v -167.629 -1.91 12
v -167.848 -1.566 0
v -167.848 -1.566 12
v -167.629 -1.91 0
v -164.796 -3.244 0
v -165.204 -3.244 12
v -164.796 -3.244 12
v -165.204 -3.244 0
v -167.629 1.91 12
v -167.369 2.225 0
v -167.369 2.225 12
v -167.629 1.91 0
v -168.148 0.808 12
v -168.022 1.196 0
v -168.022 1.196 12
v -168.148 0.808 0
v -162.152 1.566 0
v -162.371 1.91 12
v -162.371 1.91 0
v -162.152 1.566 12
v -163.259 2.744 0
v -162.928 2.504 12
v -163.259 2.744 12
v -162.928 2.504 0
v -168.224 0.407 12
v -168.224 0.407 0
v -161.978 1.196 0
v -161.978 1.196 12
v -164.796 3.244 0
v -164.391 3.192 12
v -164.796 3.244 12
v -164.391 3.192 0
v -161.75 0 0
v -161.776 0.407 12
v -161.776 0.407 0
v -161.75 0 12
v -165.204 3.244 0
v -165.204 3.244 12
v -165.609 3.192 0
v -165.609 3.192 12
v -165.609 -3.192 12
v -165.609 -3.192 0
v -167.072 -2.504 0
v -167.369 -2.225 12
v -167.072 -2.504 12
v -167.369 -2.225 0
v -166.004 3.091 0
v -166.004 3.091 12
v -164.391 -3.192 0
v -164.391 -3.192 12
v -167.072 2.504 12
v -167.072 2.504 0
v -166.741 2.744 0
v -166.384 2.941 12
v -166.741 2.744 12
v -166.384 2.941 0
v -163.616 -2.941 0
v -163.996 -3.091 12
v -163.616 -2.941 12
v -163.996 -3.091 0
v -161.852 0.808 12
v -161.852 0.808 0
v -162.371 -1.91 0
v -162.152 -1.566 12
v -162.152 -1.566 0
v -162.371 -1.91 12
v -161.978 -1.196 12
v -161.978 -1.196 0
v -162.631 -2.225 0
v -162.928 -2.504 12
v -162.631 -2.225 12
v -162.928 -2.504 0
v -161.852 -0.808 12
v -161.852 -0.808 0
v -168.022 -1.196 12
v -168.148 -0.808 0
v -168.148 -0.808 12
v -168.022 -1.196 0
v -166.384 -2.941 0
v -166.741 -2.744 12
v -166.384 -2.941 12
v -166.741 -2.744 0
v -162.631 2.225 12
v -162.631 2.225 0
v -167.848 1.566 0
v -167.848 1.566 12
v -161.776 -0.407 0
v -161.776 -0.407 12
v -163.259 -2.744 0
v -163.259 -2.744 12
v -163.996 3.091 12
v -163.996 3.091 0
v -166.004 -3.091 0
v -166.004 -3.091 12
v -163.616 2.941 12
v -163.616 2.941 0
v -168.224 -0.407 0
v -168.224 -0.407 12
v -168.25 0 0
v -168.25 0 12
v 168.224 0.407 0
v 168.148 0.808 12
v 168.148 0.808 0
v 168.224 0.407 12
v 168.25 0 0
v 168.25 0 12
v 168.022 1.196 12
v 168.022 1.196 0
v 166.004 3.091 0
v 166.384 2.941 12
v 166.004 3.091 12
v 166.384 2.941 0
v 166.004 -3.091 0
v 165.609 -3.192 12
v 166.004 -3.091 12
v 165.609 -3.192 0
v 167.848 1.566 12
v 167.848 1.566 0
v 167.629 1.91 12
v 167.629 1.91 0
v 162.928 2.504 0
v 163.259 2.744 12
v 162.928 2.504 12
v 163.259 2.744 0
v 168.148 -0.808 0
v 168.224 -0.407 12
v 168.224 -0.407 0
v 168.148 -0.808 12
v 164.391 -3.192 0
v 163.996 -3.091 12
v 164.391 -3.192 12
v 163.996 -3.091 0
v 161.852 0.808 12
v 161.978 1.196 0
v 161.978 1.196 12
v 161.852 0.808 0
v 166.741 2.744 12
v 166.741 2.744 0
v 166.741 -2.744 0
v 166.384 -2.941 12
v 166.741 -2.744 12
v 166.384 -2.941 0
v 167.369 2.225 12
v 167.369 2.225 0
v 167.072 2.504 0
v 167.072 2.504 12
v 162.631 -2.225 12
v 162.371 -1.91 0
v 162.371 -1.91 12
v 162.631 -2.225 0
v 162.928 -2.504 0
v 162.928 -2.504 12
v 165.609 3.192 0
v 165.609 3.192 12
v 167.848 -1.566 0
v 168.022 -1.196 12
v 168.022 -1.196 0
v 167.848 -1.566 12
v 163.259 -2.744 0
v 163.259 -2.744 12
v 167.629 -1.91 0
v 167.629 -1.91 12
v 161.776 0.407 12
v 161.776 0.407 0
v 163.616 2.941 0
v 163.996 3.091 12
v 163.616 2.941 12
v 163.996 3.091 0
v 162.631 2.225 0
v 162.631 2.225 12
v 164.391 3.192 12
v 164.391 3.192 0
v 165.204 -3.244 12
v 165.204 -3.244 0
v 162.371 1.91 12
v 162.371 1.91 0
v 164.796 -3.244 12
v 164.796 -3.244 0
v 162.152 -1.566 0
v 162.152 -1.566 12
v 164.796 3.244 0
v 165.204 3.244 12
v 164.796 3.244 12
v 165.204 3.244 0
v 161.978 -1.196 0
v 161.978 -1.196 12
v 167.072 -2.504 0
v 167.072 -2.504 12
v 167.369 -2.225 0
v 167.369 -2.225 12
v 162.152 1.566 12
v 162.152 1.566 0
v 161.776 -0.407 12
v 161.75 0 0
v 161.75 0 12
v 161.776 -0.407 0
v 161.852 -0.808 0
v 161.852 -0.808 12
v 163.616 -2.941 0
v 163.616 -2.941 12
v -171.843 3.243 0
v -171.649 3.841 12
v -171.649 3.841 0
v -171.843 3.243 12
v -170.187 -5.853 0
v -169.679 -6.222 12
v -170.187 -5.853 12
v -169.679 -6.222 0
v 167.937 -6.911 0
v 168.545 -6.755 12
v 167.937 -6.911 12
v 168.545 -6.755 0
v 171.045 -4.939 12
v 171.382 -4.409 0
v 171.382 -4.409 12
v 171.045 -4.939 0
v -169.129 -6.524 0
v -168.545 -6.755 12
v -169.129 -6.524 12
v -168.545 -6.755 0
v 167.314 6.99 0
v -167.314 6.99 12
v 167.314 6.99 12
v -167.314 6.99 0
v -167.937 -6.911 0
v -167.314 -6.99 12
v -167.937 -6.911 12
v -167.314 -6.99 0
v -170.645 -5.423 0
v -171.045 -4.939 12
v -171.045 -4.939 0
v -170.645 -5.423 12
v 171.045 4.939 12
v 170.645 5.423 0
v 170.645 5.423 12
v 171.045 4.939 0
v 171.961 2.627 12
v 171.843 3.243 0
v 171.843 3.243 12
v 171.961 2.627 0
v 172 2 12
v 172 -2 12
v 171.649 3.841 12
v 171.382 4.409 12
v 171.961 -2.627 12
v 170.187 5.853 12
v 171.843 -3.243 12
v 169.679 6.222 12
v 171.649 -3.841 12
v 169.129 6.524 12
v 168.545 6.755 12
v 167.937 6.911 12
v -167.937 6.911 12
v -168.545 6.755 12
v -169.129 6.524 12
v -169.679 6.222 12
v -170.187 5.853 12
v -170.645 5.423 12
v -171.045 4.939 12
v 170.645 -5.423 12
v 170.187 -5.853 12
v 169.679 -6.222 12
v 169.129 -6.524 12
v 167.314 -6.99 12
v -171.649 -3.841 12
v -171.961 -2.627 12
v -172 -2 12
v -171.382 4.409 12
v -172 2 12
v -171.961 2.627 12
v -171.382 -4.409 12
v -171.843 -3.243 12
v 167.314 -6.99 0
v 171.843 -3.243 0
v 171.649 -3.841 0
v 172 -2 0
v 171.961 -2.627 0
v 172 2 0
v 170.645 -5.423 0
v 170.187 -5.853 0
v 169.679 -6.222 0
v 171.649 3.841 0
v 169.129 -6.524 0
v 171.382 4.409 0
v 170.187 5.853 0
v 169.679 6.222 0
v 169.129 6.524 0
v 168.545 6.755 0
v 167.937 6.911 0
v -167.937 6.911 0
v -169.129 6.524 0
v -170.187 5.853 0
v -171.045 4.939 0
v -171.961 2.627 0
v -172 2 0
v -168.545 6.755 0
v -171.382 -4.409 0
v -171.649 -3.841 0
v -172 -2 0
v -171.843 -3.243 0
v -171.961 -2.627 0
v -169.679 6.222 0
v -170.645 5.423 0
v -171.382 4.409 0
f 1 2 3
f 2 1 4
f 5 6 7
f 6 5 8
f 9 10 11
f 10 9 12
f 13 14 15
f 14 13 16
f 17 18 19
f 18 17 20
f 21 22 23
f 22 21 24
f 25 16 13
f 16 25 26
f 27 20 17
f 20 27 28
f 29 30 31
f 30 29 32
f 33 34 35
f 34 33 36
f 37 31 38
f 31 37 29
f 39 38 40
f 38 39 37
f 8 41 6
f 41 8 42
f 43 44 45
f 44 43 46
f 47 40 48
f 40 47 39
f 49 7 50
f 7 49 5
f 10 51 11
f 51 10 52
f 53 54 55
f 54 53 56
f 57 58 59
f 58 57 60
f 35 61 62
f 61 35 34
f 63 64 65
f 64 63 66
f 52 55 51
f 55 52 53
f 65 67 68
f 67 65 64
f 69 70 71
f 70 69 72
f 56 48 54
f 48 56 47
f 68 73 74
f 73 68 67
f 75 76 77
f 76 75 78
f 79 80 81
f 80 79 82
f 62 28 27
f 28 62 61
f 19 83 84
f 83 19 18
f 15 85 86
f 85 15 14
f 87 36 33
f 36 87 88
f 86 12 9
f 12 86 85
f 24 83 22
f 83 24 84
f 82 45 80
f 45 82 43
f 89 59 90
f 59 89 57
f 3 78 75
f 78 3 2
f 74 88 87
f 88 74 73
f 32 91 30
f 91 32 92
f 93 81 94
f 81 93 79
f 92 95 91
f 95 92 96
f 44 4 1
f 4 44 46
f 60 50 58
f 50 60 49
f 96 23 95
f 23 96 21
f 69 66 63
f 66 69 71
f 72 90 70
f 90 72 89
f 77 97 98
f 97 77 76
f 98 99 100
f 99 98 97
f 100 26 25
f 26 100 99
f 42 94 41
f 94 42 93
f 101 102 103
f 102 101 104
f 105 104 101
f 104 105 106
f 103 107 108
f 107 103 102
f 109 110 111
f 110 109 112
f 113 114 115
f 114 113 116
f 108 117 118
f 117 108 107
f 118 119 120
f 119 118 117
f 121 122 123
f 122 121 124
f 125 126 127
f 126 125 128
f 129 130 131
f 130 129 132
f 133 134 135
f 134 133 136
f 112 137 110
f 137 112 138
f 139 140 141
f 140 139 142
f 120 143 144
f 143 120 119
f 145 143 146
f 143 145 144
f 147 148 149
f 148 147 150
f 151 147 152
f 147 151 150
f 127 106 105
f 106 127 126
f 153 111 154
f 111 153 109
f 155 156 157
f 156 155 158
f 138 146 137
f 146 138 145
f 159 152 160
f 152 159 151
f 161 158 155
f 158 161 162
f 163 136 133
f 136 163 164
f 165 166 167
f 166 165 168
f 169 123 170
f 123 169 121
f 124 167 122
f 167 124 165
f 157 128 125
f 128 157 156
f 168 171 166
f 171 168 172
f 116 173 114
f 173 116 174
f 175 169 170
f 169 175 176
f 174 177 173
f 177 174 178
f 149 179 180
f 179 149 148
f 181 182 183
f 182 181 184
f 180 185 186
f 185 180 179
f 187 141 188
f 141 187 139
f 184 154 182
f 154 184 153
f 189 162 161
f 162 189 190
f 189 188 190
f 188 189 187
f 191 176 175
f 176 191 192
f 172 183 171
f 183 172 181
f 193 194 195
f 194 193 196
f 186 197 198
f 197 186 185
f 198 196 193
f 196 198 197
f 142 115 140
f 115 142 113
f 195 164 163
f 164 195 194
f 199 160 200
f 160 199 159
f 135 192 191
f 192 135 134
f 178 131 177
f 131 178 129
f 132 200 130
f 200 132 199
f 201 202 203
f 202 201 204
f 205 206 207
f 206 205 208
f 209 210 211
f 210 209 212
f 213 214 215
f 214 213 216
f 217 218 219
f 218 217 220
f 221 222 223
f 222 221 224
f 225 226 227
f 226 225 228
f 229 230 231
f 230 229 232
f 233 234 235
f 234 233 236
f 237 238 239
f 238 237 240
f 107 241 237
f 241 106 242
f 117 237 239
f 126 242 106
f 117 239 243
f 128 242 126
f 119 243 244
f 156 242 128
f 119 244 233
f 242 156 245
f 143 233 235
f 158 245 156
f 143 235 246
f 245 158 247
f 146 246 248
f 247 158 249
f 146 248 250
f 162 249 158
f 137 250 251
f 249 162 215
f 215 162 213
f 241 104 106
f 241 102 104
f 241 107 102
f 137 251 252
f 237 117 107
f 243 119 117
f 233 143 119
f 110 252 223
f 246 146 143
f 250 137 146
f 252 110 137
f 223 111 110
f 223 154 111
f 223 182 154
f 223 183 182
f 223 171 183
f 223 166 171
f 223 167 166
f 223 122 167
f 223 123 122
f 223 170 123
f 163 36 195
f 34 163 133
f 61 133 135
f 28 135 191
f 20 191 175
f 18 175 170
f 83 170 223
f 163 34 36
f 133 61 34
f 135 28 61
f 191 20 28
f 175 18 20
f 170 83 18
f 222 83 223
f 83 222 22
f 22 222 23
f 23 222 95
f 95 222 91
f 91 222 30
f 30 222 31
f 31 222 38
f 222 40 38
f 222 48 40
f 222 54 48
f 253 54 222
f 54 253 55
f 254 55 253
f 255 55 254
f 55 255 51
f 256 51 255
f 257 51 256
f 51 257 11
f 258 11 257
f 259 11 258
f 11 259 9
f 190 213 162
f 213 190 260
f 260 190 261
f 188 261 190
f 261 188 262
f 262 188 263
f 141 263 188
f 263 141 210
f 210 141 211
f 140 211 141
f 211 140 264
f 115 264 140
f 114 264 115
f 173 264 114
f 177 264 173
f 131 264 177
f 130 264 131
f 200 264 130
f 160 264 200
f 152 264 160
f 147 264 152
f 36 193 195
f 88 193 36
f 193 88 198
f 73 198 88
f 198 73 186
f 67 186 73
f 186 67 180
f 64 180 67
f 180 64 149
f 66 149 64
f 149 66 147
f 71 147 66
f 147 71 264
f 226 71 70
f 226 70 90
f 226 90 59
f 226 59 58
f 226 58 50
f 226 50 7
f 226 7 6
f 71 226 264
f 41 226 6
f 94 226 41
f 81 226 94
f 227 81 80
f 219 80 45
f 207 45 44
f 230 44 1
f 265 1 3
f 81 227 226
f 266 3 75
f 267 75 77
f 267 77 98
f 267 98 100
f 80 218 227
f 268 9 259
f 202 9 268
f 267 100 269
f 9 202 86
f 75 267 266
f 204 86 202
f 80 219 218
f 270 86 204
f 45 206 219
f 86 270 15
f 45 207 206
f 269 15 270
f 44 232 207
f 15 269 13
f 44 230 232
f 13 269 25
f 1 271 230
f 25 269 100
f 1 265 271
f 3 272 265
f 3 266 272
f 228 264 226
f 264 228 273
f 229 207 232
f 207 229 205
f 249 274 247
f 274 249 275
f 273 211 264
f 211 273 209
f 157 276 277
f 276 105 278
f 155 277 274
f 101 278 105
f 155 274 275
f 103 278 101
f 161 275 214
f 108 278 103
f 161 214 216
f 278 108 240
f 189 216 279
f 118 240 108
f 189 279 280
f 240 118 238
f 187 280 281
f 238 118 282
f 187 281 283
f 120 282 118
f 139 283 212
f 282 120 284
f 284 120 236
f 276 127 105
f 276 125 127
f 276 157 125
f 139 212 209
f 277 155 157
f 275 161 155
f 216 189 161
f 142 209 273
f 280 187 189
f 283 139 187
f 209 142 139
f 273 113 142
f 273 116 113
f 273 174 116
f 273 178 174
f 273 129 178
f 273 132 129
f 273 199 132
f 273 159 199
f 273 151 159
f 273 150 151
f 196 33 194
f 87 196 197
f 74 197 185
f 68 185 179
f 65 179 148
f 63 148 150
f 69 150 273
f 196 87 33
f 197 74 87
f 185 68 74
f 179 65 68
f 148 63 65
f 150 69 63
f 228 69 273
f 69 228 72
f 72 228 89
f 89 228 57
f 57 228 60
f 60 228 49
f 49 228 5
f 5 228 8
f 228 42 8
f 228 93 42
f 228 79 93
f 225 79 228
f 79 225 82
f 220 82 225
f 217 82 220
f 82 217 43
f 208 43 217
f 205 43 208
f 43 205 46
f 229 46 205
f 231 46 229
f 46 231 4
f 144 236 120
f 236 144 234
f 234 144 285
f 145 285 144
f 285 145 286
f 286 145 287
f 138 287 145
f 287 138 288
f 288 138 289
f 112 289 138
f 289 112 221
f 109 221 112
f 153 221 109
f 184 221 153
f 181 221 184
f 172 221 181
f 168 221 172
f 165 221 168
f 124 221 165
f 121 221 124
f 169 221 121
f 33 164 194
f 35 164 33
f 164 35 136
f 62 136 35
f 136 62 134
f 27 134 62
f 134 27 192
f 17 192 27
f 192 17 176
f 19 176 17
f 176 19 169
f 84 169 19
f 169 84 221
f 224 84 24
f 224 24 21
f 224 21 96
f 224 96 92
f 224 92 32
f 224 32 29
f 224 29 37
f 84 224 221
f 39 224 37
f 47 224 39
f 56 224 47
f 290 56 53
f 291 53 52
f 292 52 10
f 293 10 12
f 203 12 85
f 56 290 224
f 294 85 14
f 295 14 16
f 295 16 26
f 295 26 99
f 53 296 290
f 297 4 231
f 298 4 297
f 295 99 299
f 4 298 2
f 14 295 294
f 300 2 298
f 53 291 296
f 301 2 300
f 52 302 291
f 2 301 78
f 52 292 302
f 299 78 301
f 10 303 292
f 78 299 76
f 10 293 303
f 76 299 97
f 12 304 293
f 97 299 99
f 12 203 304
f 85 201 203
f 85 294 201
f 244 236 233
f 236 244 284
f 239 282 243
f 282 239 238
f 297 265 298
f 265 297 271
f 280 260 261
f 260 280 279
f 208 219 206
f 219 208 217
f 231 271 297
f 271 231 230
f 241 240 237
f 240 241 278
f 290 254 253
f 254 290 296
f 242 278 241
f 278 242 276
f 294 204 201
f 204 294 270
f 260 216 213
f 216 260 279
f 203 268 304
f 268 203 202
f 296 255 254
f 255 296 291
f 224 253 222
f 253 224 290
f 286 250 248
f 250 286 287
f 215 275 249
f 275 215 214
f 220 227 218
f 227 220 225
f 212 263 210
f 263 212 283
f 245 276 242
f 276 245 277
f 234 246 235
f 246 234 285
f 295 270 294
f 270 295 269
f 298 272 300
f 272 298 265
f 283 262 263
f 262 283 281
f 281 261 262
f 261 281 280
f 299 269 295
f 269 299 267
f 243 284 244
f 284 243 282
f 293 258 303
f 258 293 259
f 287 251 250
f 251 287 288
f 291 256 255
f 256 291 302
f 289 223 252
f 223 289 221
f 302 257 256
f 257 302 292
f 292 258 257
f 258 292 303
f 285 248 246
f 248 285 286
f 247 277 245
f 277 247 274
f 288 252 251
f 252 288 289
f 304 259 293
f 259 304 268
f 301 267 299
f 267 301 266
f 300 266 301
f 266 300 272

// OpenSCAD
$fn = 50;


difference() {
	union() {
		hull() {
			translate(v = [-167.0000000000, 2.0000000000, 0]) {
				cylinder(h = 12, r = 5);
			}
			translate(v = [167.0000000000, 2.0000000000, 0]) {
				cylinder(h = 12, r = 5);
			}
			translate(v = [-167.0000000000, -2.0000000000, 0]) {
				cylinder(h = 12, r = 5);
			}
			translate(v = [167.0000000000, -2.0000000000, 0]) {
				cylinder(h = 12, r = 5);
			}
		}
	}
	union() {
		translate(v = [-165.0000000000, 0.0000000000, -100.0000000000]) {
			cylinder(h = 200, r = 3.2500000000);
		}
		translate(v = [-165.0000000000, 0.0000000000, -100.0000000000]) {
			cylinder(h = 200, r = 3.2500000000);
		}
		translate(v = [165.0000000000, 0.0000000000, -100.0000000000]) {
			cylinder(h = 200, r = 3.2500000000);
		}
		translate(v = [165.0000000000, 0.0000000000, -100.0000000000]) {
			cylinder(h = 200, r = 3.2500000000);
		}
	}
}
